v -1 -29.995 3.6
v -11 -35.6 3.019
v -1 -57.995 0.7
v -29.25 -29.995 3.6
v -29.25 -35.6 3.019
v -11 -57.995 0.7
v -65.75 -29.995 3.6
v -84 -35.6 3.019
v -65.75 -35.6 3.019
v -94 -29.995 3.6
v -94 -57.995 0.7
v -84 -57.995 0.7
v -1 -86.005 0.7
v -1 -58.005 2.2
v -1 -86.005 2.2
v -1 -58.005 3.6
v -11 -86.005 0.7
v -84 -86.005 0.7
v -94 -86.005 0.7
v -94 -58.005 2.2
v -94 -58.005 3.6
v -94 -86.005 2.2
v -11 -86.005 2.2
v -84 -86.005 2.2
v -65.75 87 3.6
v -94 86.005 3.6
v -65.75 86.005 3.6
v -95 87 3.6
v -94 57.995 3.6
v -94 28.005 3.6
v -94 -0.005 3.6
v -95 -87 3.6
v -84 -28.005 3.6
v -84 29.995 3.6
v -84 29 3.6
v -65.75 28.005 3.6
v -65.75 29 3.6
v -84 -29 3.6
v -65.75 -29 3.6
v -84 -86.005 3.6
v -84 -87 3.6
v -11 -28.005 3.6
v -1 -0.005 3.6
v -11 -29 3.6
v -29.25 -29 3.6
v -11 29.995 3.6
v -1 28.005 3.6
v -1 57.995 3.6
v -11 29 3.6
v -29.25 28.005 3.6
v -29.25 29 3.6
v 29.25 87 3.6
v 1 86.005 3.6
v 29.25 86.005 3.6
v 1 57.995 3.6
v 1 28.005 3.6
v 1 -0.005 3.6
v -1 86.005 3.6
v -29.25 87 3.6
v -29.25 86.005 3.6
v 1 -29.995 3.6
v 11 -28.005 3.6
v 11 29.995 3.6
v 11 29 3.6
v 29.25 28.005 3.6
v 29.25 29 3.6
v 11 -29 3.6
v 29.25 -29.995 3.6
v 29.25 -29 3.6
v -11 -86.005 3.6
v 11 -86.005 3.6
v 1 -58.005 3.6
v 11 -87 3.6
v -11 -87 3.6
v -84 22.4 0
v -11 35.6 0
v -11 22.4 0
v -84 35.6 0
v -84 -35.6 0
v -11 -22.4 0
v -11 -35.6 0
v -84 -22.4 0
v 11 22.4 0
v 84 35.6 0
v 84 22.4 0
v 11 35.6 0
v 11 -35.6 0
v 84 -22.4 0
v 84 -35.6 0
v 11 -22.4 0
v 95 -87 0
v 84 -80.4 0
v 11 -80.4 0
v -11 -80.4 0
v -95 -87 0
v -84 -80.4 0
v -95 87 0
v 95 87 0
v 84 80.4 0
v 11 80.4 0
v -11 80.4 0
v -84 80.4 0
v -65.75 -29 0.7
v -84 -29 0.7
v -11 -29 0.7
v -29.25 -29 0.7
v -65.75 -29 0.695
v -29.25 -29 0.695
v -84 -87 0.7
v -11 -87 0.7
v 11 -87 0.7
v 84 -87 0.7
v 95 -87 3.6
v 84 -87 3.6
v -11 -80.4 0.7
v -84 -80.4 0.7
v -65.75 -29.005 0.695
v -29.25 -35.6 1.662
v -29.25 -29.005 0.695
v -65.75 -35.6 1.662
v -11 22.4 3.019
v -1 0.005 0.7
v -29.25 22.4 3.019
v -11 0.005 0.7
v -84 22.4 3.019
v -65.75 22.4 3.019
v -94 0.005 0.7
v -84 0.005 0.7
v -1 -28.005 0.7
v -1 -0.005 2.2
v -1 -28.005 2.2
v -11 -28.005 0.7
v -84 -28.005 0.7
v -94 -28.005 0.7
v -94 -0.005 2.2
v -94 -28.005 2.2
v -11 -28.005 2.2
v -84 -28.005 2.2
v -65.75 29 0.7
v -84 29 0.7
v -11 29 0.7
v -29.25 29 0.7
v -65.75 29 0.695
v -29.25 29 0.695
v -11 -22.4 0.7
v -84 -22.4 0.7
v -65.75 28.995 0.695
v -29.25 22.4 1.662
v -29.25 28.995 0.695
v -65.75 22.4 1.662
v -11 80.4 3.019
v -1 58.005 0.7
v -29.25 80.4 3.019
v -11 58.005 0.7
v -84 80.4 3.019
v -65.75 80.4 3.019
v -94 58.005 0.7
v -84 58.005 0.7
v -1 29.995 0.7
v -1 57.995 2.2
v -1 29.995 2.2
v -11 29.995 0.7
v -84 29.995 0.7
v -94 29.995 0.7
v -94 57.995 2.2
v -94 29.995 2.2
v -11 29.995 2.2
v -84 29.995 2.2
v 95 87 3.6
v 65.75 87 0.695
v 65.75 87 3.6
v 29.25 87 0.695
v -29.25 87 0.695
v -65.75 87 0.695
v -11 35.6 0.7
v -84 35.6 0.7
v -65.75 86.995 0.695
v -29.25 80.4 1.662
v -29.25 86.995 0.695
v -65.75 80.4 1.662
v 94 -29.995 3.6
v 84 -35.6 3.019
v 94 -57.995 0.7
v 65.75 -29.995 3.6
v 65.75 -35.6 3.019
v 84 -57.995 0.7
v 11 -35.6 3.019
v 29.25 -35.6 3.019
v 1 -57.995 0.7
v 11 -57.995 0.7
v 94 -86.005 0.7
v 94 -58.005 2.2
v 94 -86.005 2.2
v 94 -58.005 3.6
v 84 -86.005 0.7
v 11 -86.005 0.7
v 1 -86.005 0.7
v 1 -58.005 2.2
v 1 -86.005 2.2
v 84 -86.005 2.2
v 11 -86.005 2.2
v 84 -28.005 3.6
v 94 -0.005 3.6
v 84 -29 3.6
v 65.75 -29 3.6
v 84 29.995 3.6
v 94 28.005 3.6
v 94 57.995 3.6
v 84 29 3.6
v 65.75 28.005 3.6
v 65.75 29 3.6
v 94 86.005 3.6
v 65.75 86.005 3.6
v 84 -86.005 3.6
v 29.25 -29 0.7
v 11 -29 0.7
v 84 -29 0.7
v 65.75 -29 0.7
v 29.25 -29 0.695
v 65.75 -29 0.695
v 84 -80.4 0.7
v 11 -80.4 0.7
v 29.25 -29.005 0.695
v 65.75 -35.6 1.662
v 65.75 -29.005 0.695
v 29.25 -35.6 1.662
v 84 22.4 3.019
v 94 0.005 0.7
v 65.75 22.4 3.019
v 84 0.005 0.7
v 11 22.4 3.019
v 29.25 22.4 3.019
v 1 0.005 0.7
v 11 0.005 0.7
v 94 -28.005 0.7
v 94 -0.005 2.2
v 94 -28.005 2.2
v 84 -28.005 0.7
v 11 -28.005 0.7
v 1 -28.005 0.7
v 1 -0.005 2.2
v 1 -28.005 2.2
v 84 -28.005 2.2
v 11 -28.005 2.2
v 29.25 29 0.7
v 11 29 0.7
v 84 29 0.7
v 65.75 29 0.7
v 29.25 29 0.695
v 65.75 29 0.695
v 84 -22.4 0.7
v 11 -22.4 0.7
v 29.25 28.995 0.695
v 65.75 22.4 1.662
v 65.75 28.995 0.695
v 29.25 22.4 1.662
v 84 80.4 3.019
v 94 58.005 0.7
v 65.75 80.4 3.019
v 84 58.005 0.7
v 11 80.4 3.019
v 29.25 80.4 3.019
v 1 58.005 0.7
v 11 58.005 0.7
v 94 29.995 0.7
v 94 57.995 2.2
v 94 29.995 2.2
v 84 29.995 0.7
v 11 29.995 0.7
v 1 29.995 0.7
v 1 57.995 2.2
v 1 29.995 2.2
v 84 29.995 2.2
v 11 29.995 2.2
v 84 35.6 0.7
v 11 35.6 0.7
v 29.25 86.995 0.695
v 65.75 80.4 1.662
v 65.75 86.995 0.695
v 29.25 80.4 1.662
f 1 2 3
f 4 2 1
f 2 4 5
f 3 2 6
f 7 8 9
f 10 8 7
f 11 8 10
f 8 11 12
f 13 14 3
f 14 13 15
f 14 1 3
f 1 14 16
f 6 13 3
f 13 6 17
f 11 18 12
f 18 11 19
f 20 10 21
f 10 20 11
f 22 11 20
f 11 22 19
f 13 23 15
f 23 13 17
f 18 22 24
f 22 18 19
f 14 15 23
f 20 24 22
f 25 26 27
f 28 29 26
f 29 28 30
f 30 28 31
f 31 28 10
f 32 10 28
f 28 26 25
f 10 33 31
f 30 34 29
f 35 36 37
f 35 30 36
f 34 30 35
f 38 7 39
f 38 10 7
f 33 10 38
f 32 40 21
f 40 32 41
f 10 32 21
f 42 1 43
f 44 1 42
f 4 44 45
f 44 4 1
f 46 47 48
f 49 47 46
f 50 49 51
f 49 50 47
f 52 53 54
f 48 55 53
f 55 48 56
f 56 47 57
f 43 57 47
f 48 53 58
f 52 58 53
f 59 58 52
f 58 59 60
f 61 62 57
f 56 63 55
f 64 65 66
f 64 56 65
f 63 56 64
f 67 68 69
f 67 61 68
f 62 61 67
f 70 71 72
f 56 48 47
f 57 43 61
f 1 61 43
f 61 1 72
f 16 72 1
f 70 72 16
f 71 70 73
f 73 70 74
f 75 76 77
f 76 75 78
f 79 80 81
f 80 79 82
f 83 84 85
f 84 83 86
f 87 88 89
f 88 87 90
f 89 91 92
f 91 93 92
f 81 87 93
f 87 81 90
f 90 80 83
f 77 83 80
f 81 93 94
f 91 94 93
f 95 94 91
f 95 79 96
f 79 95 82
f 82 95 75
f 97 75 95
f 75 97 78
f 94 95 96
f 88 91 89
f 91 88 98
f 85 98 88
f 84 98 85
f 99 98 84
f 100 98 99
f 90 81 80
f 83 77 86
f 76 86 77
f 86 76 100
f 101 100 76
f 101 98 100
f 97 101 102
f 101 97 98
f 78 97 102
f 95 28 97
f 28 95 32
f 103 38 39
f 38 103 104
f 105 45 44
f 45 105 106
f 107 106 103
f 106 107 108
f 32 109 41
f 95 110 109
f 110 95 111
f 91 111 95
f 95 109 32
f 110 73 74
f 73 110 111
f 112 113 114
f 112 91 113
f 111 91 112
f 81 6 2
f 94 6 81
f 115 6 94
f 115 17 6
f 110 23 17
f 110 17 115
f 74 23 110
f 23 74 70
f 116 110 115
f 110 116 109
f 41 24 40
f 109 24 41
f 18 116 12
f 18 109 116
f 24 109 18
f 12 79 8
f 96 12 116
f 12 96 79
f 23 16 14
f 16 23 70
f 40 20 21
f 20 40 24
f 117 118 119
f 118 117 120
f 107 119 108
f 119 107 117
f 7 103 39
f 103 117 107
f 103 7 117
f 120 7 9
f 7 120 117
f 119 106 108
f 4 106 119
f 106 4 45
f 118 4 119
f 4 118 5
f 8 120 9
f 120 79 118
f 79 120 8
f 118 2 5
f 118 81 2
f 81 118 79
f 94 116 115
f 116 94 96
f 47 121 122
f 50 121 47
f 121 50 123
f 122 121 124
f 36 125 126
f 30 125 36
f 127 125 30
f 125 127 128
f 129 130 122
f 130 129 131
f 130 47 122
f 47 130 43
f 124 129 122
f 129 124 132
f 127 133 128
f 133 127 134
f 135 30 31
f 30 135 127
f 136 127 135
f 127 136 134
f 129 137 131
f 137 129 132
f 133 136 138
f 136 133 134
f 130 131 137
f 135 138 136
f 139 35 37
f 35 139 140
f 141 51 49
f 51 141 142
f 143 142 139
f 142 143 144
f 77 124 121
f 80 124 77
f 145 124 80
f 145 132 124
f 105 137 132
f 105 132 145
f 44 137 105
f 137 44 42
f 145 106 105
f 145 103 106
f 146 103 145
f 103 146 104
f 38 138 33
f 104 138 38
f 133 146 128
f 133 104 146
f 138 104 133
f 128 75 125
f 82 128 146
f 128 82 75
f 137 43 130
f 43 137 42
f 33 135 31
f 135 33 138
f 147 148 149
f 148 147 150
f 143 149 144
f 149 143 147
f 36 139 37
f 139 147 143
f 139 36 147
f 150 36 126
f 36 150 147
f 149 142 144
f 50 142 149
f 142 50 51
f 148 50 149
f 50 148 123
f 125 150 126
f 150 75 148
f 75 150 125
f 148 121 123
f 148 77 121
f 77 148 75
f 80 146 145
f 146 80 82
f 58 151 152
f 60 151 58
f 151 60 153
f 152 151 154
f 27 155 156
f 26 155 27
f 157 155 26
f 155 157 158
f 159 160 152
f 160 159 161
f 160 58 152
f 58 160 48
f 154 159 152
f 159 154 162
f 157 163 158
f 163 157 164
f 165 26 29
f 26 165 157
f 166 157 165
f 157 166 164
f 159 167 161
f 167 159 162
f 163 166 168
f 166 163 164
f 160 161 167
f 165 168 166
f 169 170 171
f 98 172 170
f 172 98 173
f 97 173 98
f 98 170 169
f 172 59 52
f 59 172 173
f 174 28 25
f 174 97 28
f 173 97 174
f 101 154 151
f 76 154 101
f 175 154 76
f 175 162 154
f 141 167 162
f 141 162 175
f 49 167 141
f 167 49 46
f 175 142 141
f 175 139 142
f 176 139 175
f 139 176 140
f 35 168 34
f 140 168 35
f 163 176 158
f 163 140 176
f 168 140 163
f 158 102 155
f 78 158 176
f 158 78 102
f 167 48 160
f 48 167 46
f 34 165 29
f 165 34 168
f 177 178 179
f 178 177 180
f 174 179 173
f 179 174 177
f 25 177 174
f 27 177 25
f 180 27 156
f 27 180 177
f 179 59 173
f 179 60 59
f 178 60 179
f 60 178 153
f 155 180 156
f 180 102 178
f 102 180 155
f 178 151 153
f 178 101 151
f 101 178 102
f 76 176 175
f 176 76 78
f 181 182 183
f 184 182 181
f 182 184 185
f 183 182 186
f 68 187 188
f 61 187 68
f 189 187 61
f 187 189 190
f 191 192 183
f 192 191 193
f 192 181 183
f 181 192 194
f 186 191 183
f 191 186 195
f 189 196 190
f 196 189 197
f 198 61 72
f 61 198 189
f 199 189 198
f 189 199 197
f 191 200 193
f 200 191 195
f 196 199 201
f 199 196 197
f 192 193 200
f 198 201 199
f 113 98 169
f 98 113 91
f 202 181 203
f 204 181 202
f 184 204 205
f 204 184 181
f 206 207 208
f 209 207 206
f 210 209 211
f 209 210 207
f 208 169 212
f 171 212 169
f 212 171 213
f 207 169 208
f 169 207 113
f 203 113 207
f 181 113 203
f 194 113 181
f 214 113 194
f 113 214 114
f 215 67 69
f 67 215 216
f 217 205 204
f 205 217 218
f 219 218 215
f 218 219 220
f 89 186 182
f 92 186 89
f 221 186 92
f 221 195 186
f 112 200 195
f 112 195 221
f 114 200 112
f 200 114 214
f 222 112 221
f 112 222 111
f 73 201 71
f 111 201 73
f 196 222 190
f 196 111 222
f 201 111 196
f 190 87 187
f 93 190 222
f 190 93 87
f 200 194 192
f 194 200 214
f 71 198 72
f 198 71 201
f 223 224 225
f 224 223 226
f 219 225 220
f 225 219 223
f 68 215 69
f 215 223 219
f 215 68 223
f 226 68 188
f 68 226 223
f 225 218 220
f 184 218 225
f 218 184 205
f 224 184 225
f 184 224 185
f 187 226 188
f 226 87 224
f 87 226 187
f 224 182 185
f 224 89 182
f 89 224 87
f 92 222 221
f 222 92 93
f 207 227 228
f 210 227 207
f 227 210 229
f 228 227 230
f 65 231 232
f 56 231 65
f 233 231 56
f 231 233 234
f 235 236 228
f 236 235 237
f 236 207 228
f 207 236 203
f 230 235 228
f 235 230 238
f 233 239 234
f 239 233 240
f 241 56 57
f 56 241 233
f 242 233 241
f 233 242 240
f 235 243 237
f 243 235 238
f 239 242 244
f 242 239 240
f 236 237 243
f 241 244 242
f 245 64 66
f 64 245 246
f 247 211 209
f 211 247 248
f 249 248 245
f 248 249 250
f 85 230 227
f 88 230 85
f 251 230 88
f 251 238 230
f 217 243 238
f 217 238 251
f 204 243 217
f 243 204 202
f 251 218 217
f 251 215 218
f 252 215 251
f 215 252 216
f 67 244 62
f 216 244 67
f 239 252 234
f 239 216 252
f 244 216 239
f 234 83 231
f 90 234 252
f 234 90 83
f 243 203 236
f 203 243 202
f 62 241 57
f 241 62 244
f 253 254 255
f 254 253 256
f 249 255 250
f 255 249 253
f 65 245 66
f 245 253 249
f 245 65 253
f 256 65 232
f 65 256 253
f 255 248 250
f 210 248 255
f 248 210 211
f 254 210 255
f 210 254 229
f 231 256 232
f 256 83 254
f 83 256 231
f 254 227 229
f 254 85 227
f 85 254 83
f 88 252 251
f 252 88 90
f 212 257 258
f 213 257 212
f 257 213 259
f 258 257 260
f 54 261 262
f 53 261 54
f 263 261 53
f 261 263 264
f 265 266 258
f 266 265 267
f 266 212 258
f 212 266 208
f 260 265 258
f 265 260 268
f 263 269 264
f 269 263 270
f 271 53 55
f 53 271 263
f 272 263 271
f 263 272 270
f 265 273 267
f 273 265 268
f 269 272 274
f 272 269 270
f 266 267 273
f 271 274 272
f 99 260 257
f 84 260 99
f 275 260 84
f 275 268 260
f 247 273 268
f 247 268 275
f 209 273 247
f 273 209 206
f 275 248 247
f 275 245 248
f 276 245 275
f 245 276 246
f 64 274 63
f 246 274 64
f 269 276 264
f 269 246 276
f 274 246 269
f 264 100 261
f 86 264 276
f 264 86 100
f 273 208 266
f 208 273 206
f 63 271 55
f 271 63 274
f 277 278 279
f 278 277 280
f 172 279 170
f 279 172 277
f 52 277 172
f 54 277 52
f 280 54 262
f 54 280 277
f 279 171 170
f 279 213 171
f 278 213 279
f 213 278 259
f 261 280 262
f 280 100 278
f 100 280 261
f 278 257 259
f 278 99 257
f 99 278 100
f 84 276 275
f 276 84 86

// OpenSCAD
// Wall Mounted Single Card Holder
// By Brian Khuu 2022-04-22
// RevC : This revision is an optimiation for ease of pickup as well as being able to view cards behind a glass

print_layer_height = 0.2;

// Businesscard
// Default values based on https://www.mbe.com.au/what-is-the-standard-business-card-size-in-australia/
businesscard_width = 93; // 90mm but some in real life are more like 91mm (Plus 0.5 tol )
businesscard_height = 56; // 55mm (add 0.5mm tol)
businesscard_thickness = 1.5; // 0.25mm for thin paper cards. 0.8mm for thick plastic cards. We need to add extra thickness to account for layer droop

// Holder
wall_spacing = 2;
wall_card_grip = 20;
wall_x_count = 2; //2
wall_y_count = 3; //3

// Calc
wall_base = print_layer_height*3+0.1;
wall_top = print_layer_height*3+0.1;
wall_height = wall_base + businesscard_thickness + wall_top*2;

module cardSlopeOutline()
{
    hull()
    {
        slope_width = (businesscard_width-wall_card_grip)/2;
        translate([0,businesscard_height/2+1, wall_base])
        cube([slope_width, 0.01, 0.01], center = true);
        translate([0,businesscard_height/4,businesscard_thickness + wall_top*2])
        cube([slope_width, 0.01, 0.01], center = true);
    }
}

module cardWindowOutline()
{
    hull()
    {
        translate([0,businesscard_height/2,businesscard_thickness + wall_top*2])
        cube([businesscard_width, 0.01, 0.01], center = true);
        translate([0,0,0])
        cube([businesscard_width, 0.01, 0.01], center = true);
    }
    hull()
    {
        translate([0,0,businesscard_thickness + wall_top*2])
        cube([businesscard_width, 0.01, 0.01], center = true);
        translate([0,-businesscard_height/2,0])
        cube([businesscard_width-wall_card_grip, 0.01, 0.01], center = true);
    }
}

module cardholder(reducePlastic=false)
{
    if (0)
    translate([0,0,wall_base+businesscard_thickness])
        rotate([2,0,0])
        %cube([85, 54, 0.1], center = true);

    difference()
    {
        translate([0,0,wall_height/2])
            cube([businesscard_width+wall_spacing, businesscard_height+wall_spacing, wall_height], center = true);

        // Card Slide
        translate([0,0,wall_base])
        translate([0,0,businesscard_thickness/2])
        {
            // Upper
            hull()
            {
                translate([0,businesscard_height/2,businesscard_thickness + wall_top*2])
                cube([businesscard_width, 0.01, businesscard_thickness], center = true);

                translate([0,0,0])
                cube([businesscard_width, 0.01, businesscard_thickness], center = true);
            }
            // Lower
            hull()
            {
                translate([0,-businesscard_height/2,0])
                cube([businesscard_width, 0.01, businesscard_thickness], center = true);
                cube([businesscard_width, 0.01, businesscard_thickness], center = true);
            }
        }

        // Grip
        translate([0,0,wall_height/2+wall_base])
            hull()
            {
                translate([0,0,0])
                cube([businesscard_width-wall_card_grip, 0.01, wall_height], center = true);

                translate([0,-businesscard_height,0])
                cube([businesscard_width-wall_card_grip, 0.01, wall_height], center = true);
            }


        // Card Window
        translate([0,0,wall_base+businesscard_thickness/2])
        {
            hull()
            {
                // Card Window Base
                cardWindowOutline();
                // Card Window Top
                translate([0,0,businesscard_thickness + wall_top * 2])
                    cardWindowOutline();
            }
        }

        // Card Slope
        translate([0,0,0])
        {
            hull()
            {
                // Card Window Base
                cardSlopeOutline();
                // Card Window Top
                translate([0,0,businesscard_thickness + wall_top * 2])
                    cardSlopeOutline();
            }
        }

        // Reduce Plastic
        if (reducePlastic)
        translate([0,0,wall_base+businesscard_thickness/2+0.5])
        {
            cube([businesscard_width-wall_card_grip,businesscard_height*0.8, wall_height+1], center=true);
        }
    }
}

if (wall_x_count == 1 && wall_y_count == 1)
{
    cardholder(true);
}
else
{
    translate([-((businesscard_width+wall_spacing)*wall_x_count)/2,-((businesscard_height+wall_spacing)*wall_y_count)/2,0])
    {
        for (x = [0: 1 : wall_x_count-1])
            for (y = [0 : 1 : wall_y_count-1])
                translate([x*(businesscard_width+wall_spacing) + (businesscard_width+wall_spacing)/2, y*(businesscard_height+wall_spacing)+(businesscard_height+wall_spacing)/2, 0])
                        cardholder(true);
    }
}
